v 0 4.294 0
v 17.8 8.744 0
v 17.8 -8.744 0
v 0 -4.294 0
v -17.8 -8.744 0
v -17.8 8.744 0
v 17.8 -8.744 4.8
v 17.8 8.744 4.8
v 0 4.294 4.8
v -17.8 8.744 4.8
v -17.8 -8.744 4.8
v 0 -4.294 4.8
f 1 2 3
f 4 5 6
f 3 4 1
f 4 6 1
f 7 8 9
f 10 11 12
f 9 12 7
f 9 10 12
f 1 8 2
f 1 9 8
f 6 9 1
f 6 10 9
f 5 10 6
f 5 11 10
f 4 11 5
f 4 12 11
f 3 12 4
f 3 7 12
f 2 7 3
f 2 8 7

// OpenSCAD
include <../lib/scaffold-cube-lib.scad>;
$fn = 40;
bowtie();
